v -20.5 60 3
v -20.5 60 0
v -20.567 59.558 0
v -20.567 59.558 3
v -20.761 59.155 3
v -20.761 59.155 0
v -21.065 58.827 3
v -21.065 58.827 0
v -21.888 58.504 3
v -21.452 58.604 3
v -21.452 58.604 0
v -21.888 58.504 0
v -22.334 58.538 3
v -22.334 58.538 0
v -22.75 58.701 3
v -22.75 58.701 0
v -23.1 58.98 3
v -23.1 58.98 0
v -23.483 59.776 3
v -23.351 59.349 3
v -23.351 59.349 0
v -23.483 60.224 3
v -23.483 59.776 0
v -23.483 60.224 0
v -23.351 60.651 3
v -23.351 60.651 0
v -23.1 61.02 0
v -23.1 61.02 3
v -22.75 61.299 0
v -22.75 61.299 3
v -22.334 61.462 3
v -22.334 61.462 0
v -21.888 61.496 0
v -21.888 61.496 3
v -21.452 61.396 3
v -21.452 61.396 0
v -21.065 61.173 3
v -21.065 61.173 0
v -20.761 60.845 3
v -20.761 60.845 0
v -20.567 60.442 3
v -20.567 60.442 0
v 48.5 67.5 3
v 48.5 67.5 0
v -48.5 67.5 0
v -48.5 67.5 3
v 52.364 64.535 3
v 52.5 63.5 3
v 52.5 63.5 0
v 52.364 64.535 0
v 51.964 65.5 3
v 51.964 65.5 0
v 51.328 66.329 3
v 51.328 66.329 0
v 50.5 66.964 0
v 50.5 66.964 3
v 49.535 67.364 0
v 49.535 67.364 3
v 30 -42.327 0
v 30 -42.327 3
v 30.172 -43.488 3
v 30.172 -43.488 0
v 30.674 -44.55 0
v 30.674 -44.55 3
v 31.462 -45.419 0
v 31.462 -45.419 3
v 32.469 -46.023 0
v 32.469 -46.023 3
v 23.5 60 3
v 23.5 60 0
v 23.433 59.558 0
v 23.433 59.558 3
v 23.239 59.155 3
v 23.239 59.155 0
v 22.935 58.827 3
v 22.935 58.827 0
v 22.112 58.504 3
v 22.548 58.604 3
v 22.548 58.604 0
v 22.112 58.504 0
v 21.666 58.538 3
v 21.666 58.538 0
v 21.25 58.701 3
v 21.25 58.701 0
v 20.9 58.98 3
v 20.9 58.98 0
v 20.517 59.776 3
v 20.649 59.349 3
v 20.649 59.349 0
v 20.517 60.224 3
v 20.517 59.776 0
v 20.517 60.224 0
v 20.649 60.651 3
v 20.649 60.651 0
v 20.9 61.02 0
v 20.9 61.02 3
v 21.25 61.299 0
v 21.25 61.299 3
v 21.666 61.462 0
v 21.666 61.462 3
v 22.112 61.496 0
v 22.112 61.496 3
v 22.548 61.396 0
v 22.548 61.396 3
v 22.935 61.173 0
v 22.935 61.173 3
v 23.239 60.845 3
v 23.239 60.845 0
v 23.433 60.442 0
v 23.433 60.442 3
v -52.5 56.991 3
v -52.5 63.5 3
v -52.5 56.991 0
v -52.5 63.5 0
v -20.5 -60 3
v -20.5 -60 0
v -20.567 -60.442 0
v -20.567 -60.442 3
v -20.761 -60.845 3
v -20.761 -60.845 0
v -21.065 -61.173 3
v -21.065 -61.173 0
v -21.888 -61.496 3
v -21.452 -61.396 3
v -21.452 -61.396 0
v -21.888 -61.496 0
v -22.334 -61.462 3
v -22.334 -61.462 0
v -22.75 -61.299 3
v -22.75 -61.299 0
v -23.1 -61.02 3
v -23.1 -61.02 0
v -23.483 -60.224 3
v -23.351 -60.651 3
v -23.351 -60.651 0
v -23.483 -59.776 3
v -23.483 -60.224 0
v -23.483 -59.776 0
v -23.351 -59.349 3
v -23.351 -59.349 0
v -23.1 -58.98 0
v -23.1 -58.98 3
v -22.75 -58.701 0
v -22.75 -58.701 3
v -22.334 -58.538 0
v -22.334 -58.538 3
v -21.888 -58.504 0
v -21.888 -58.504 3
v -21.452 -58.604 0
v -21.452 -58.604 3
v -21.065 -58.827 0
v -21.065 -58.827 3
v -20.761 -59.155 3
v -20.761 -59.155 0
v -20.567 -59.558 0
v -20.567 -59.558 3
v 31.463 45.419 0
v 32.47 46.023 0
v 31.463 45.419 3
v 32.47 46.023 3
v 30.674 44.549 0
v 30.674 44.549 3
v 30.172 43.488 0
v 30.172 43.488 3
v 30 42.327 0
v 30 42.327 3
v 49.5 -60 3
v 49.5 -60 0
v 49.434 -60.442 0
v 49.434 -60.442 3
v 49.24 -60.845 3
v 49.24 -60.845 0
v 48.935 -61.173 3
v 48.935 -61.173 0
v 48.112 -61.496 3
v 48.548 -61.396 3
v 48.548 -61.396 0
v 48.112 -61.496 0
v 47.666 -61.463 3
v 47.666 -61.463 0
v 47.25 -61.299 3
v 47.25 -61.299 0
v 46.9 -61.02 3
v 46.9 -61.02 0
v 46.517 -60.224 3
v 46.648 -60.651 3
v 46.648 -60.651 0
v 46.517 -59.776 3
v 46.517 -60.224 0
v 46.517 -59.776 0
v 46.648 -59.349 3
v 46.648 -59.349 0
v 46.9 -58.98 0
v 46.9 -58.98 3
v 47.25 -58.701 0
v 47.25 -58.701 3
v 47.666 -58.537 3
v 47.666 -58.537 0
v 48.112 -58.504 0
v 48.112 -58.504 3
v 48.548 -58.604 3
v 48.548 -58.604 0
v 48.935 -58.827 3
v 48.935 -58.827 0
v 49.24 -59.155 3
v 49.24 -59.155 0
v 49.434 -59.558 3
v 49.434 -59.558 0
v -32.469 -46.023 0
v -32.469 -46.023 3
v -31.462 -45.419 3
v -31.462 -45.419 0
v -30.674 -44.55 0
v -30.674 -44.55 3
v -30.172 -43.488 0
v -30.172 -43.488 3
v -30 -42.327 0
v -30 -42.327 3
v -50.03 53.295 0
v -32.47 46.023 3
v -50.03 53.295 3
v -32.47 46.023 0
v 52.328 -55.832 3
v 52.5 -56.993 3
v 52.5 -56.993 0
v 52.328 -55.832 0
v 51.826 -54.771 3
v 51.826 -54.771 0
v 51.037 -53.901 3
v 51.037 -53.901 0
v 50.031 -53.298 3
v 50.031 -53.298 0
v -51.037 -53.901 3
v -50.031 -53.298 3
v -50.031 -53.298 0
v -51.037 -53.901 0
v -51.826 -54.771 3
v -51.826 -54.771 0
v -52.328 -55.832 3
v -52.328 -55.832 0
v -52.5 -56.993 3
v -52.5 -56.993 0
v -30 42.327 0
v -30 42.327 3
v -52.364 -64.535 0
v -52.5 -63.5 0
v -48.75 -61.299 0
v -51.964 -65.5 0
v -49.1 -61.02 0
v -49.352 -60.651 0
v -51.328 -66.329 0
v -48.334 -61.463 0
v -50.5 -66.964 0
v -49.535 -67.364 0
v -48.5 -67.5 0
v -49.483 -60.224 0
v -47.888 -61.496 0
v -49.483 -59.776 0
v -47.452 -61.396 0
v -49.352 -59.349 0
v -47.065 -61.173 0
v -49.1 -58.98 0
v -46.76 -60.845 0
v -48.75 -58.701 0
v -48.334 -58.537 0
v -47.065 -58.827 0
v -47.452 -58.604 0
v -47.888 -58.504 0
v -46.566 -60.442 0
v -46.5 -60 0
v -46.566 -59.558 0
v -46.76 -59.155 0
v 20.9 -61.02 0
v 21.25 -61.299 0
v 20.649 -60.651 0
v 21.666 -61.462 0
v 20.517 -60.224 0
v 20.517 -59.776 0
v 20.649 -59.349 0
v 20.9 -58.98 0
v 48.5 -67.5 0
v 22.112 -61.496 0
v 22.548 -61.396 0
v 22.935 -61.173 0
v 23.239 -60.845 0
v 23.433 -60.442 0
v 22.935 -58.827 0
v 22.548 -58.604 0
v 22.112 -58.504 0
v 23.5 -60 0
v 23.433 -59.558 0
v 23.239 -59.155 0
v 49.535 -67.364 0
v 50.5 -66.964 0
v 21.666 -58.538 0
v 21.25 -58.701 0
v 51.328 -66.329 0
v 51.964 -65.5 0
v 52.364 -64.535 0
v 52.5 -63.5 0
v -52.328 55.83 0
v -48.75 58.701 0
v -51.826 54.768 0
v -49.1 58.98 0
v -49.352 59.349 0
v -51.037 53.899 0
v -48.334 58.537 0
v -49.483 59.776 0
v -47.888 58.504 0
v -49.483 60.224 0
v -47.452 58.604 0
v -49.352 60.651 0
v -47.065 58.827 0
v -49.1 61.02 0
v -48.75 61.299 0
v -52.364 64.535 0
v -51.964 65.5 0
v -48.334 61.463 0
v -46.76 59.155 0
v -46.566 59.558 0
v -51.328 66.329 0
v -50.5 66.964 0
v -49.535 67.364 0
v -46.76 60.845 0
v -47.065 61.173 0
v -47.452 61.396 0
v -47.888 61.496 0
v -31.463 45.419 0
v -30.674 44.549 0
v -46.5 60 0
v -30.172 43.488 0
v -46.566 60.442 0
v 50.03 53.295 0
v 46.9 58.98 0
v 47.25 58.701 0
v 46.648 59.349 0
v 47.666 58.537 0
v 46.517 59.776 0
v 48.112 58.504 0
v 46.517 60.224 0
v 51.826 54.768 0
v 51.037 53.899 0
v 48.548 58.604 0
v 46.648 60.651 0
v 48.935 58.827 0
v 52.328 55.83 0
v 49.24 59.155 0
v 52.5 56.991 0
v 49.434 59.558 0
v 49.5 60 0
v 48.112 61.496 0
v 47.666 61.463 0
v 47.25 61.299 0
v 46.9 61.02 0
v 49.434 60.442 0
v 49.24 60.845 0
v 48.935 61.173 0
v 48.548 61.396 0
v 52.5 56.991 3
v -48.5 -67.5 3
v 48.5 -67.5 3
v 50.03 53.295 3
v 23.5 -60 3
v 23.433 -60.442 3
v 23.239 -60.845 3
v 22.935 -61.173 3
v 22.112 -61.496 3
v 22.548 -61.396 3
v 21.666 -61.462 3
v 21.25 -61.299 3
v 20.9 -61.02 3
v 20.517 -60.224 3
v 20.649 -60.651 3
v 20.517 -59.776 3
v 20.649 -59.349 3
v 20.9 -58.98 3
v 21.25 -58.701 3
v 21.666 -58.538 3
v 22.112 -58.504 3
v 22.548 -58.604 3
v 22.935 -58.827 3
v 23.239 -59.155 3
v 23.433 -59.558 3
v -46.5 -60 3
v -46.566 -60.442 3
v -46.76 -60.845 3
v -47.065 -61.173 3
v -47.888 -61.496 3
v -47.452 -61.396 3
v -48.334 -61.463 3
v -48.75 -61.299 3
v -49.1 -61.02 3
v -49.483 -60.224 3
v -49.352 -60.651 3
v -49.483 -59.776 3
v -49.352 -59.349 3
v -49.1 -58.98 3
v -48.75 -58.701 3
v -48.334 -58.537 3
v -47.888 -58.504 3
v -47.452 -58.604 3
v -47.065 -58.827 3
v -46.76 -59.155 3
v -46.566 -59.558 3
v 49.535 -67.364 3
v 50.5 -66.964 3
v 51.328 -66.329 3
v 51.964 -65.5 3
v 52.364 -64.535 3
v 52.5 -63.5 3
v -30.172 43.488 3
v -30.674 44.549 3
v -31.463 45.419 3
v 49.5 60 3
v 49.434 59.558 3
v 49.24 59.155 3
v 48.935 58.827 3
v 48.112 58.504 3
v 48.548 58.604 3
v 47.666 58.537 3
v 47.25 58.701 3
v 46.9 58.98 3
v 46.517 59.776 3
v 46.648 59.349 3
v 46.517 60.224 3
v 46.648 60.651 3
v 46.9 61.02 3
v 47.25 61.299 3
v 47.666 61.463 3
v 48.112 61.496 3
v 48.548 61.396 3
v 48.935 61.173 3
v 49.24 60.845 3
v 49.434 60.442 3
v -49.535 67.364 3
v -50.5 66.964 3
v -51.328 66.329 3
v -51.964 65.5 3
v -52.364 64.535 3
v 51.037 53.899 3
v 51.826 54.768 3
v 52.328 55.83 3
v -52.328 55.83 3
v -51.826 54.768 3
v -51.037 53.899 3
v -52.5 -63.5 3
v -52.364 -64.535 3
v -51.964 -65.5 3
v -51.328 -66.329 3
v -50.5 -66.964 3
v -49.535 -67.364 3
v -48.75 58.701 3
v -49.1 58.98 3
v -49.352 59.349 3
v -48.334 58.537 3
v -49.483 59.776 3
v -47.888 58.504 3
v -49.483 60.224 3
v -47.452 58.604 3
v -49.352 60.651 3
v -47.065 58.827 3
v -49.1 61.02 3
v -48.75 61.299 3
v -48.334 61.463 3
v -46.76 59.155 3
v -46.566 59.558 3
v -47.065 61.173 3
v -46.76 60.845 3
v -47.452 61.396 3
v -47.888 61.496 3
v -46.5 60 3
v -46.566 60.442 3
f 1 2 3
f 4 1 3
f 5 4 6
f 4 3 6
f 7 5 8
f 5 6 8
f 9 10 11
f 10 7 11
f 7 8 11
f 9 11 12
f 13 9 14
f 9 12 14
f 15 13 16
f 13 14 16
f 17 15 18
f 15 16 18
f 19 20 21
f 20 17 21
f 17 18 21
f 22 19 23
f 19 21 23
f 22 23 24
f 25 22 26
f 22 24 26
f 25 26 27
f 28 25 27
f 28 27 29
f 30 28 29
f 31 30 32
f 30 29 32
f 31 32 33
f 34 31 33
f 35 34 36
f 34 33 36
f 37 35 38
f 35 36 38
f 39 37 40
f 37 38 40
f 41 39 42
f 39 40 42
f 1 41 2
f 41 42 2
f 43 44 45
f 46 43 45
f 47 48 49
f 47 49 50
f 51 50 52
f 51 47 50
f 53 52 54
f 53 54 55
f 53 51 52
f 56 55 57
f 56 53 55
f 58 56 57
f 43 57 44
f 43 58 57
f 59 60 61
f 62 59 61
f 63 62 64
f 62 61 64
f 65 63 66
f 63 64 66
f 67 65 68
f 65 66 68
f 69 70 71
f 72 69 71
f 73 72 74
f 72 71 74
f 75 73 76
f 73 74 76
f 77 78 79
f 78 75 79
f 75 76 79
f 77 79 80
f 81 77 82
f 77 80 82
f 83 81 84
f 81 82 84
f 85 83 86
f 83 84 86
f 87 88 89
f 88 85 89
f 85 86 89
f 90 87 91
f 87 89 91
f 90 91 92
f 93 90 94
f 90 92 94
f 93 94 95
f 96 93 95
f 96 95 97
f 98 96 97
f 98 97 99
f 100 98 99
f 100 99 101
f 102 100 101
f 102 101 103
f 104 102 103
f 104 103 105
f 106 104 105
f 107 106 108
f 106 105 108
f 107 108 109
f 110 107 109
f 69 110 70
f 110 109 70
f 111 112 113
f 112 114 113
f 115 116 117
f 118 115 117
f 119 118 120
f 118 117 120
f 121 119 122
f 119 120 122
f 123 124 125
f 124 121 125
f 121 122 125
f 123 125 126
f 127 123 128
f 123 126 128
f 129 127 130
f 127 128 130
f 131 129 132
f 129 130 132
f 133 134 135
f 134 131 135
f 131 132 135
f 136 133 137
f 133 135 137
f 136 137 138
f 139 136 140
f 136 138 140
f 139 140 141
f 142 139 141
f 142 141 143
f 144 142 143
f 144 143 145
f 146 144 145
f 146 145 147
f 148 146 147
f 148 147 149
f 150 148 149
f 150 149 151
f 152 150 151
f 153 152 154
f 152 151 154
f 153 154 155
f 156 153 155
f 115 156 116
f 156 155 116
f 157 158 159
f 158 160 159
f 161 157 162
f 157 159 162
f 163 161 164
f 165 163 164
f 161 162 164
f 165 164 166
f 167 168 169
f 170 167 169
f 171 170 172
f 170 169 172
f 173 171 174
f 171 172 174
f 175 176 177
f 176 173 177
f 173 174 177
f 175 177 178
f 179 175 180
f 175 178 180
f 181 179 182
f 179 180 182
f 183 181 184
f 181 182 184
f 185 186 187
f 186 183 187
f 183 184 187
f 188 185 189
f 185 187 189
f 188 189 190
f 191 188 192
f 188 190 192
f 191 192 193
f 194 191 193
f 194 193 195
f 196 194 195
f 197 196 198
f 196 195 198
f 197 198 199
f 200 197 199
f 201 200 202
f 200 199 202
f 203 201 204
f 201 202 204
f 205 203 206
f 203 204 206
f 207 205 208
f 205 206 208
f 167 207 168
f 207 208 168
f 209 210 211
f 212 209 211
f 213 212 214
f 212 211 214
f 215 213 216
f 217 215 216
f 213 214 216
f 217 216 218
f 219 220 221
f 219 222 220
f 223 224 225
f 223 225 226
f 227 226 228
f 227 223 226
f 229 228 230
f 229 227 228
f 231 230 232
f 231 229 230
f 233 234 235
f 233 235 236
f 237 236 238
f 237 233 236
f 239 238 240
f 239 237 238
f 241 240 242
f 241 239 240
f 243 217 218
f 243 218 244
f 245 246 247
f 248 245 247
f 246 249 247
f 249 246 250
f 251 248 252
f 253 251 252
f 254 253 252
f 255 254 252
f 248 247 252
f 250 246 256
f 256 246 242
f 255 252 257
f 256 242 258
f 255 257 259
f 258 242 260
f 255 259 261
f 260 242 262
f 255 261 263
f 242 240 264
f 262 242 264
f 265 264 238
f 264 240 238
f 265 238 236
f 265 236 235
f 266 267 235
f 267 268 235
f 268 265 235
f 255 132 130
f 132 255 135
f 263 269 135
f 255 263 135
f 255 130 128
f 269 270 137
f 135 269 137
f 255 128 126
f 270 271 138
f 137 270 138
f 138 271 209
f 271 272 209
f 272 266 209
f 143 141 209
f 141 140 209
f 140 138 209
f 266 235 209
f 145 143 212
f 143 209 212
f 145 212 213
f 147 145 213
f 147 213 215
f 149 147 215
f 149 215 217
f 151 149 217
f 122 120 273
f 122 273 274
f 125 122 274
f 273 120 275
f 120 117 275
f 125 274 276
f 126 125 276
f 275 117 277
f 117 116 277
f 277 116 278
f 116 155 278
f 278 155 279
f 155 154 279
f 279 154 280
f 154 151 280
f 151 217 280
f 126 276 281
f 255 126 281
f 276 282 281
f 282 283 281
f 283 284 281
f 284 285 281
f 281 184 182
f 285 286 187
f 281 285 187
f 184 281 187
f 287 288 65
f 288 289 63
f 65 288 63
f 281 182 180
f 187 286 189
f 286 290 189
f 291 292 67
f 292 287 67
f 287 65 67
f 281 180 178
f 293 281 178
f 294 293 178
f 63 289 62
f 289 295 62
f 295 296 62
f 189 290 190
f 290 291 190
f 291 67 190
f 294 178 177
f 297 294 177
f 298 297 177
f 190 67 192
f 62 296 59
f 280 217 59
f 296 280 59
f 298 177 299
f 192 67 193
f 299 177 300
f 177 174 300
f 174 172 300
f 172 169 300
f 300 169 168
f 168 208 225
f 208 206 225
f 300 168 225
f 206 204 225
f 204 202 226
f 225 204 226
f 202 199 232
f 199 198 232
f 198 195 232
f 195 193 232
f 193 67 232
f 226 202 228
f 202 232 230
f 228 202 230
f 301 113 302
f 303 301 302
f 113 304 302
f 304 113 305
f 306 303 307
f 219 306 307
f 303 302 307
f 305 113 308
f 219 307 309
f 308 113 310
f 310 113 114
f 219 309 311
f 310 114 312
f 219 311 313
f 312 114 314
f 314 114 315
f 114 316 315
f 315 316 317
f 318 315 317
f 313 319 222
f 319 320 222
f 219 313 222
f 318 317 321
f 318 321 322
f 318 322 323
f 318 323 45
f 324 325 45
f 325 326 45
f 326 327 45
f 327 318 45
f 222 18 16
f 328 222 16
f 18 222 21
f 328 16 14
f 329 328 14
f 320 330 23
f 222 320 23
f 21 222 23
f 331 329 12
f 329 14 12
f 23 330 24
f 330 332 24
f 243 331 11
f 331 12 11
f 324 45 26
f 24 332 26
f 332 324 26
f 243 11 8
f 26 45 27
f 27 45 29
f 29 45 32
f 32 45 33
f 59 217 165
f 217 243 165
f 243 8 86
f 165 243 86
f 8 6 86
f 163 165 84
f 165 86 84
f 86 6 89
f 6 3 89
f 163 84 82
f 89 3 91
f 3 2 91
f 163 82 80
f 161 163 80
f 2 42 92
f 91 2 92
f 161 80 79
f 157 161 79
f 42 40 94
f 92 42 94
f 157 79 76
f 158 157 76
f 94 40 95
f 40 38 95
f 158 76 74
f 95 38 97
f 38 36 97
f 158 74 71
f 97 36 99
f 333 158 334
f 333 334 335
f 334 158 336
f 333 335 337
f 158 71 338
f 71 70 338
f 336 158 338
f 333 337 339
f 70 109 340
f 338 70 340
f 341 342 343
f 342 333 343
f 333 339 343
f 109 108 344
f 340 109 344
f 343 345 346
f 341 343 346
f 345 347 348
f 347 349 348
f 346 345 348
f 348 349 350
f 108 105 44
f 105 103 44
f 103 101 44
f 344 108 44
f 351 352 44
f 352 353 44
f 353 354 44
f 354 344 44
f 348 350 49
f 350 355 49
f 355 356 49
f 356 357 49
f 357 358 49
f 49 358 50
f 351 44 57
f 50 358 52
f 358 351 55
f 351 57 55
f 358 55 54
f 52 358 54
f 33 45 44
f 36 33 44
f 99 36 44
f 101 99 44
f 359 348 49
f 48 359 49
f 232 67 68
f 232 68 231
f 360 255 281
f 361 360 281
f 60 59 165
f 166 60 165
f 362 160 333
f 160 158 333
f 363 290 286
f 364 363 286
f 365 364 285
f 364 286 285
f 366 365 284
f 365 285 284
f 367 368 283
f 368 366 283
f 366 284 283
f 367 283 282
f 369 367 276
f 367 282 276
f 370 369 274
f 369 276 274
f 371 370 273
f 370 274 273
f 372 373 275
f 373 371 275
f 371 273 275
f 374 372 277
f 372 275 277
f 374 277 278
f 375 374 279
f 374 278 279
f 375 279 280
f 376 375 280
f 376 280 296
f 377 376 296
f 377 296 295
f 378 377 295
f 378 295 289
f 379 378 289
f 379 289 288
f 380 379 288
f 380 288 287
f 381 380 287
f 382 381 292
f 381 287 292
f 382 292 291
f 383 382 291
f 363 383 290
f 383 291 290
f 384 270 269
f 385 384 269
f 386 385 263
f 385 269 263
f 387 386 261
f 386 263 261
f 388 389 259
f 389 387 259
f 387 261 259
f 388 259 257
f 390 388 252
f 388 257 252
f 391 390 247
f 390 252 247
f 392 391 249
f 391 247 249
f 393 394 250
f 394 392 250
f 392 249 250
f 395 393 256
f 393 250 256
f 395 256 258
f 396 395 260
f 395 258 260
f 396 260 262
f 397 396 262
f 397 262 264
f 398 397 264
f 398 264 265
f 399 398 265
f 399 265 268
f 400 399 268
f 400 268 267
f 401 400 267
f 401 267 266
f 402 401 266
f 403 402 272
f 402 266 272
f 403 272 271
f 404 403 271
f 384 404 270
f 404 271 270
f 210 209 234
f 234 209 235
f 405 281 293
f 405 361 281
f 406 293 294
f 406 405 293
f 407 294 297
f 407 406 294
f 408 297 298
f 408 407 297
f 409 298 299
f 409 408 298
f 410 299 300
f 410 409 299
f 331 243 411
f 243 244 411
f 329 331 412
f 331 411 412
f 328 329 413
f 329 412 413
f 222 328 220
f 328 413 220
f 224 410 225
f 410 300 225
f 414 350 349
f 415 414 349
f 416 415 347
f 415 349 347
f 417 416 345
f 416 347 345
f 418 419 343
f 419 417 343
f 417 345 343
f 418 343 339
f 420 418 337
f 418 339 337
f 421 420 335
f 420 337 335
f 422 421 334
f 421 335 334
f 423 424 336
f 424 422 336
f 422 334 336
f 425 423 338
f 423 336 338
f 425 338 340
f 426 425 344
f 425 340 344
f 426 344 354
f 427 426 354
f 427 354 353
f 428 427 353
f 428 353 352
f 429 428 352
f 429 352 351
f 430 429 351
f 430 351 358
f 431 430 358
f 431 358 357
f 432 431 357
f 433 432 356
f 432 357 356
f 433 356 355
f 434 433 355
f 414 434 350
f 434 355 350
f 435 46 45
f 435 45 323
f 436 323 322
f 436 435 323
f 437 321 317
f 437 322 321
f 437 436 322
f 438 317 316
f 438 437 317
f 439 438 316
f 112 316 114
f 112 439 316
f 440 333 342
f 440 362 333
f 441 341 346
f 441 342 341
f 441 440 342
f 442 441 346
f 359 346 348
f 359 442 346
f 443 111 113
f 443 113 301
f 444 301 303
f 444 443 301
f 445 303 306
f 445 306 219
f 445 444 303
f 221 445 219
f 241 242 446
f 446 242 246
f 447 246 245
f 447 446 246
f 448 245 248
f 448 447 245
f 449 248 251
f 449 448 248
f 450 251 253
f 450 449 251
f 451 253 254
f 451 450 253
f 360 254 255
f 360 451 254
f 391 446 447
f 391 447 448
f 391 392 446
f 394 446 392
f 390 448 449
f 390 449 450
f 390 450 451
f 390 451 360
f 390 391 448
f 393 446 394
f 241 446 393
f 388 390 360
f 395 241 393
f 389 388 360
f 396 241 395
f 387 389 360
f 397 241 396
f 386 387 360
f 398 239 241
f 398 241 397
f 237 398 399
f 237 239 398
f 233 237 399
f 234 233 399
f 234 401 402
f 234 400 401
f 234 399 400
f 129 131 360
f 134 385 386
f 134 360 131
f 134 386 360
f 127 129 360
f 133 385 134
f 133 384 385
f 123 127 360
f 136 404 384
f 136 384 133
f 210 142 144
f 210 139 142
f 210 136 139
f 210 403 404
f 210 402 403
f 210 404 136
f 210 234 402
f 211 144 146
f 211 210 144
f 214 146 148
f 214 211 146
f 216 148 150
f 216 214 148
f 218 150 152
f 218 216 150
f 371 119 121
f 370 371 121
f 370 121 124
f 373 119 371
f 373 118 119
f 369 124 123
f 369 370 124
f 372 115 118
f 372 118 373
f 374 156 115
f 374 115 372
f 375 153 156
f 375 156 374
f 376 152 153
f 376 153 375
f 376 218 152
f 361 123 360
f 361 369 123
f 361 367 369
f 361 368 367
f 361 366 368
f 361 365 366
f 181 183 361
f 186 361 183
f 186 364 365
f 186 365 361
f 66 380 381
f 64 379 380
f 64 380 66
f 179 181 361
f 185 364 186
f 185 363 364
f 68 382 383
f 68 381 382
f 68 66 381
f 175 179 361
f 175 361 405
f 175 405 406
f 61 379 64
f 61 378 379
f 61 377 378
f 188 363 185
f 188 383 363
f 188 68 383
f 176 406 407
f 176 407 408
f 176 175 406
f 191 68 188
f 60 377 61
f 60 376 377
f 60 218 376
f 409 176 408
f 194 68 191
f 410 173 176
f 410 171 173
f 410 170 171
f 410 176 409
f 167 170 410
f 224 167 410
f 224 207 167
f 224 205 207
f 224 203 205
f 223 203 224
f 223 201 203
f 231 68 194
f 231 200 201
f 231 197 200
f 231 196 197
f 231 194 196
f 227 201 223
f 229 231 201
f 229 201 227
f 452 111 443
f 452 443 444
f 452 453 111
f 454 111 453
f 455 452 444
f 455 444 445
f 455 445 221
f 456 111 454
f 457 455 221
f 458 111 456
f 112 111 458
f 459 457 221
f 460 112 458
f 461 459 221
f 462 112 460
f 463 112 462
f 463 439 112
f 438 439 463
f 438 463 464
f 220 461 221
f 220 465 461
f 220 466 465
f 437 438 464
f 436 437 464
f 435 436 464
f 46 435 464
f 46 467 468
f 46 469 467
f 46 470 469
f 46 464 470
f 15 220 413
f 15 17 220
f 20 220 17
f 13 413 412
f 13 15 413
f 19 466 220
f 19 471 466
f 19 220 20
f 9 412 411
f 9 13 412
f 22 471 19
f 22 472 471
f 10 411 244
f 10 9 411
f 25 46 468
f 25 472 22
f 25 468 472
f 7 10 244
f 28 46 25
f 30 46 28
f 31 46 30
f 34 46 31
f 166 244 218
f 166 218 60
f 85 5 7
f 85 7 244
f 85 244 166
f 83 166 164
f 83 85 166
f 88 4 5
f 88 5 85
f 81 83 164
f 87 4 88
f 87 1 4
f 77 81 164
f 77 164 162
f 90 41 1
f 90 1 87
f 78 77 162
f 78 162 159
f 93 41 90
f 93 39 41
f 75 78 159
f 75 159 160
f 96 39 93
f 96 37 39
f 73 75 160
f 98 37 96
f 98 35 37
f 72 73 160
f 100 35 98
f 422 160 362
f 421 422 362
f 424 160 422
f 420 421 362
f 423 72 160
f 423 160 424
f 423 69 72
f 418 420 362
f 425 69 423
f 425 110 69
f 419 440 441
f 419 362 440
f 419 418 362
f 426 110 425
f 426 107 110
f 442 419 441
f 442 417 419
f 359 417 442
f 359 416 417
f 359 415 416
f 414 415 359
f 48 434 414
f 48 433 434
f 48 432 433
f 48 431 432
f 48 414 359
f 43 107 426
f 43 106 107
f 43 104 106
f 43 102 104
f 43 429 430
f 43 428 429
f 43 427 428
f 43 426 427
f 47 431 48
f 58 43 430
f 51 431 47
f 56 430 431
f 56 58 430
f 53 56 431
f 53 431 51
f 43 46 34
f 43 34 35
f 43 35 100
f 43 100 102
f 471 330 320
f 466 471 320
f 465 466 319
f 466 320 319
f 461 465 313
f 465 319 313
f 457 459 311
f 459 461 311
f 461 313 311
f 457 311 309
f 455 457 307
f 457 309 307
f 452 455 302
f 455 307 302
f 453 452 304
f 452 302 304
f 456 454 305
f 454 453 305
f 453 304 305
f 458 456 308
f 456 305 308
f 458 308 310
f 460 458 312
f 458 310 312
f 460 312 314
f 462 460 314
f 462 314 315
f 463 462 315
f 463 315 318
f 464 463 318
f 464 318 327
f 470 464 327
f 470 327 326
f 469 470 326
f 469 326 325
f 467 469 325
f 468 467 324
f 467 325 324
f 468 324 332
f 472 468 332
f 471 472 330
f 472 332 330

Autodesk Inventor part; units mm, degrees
ref_plane "YZ Plane" through (0, 0, 0) normal (1, 0, 0) x (0, 1, 0)
ref_plane "XZ Plane" through (0, 0, 0) normal (0, 1, 0) x (-1, 0, 0)
ref_plane "XY Plane" through (0, 0, 0) normal (0, 0, 1) x (1, 0, 0)
sketch "Sketch1" plane through (0, 0, 0) normal (0, 0, 1) x (1, 0, 0)
  point P0 (0, 0)
sketch "Sketch2" plane through (0, 0, 0) normal (0, 0, 1) x (1, 0, 0)
  line L0 (-52.4998, -67.5002) -> (52.4998, -67.5002)
  line L1 (52.4998, -67.5002) -> (52.4998, 67.5002)
  line L2 (52.4998, 67.5002) -> (-52.4998, 67.5002)
  line L3 (-52.4998, 67.5002) -> (-52.4998, -67.5002)
  circle A0 centre (48, 60) radius 1.5002
  circle A1 centre (-48, 60) radius 1.5002
  circle A2 centre (-48, -60) radius 1.5002
  circle A3 centre (48, -60) radius 1.5002
  circle A4 centre (22, 60) radius 1.4999
  circle A5 centre (-22, 60) radius 1.4999
  circle A6 centre (22, -60) radius 1.4999
  circle A7 centre (-22, -60) radius 1.4999
  line L4 (0, -44.9999) -> (0, 44.9999)
  line L5 (30, -44.9999) -> (30, 44.9999)
  line L6 (30, 44.9999) -> (52.4998, 54.3179)
  line L7 (30, -44.9999) -> (52.4998, -54.3208)
  line L8 (-30, -44.9999) -> (-30, 44.9999)
  line L9 (-30, 44.9999) -> (-52.4998, 54.3179)
  line L10 (-30, -44.9999) -> (-52.4998, -54.3208)
extrude "Extrusion3" add sketch "Sketch2" along normal blind 3
fillet "Fillet4" radius 4 4 edges at (-52.4998, 67.5002, 1.5) (52.4998, 67.5002, 1.5) (52.4998, -67.5002, 1.5) (-52.4998, -67.5002, 1.5)
extrude "Extrusion4" cut sketch "Sketch2" along normal blind 10 contours L3 L9 L8 L10 | L7 L5 L6 L1
fillet "Fillet5" radius 4 8 edges at (52.4998, 54.3179, 1.5) (30, 44.9999, 1.5) (-30, 44.9999, 1.5) (-52.4998, 54.3179, 1.5) (-30, -44.9999, 1.5) (-52.4998, -54.3208, 1.5) (30, -44.9999, 1.5) (52.4998, -54.3208, 1.5)
properties part number "Controller - Power Board v2"
